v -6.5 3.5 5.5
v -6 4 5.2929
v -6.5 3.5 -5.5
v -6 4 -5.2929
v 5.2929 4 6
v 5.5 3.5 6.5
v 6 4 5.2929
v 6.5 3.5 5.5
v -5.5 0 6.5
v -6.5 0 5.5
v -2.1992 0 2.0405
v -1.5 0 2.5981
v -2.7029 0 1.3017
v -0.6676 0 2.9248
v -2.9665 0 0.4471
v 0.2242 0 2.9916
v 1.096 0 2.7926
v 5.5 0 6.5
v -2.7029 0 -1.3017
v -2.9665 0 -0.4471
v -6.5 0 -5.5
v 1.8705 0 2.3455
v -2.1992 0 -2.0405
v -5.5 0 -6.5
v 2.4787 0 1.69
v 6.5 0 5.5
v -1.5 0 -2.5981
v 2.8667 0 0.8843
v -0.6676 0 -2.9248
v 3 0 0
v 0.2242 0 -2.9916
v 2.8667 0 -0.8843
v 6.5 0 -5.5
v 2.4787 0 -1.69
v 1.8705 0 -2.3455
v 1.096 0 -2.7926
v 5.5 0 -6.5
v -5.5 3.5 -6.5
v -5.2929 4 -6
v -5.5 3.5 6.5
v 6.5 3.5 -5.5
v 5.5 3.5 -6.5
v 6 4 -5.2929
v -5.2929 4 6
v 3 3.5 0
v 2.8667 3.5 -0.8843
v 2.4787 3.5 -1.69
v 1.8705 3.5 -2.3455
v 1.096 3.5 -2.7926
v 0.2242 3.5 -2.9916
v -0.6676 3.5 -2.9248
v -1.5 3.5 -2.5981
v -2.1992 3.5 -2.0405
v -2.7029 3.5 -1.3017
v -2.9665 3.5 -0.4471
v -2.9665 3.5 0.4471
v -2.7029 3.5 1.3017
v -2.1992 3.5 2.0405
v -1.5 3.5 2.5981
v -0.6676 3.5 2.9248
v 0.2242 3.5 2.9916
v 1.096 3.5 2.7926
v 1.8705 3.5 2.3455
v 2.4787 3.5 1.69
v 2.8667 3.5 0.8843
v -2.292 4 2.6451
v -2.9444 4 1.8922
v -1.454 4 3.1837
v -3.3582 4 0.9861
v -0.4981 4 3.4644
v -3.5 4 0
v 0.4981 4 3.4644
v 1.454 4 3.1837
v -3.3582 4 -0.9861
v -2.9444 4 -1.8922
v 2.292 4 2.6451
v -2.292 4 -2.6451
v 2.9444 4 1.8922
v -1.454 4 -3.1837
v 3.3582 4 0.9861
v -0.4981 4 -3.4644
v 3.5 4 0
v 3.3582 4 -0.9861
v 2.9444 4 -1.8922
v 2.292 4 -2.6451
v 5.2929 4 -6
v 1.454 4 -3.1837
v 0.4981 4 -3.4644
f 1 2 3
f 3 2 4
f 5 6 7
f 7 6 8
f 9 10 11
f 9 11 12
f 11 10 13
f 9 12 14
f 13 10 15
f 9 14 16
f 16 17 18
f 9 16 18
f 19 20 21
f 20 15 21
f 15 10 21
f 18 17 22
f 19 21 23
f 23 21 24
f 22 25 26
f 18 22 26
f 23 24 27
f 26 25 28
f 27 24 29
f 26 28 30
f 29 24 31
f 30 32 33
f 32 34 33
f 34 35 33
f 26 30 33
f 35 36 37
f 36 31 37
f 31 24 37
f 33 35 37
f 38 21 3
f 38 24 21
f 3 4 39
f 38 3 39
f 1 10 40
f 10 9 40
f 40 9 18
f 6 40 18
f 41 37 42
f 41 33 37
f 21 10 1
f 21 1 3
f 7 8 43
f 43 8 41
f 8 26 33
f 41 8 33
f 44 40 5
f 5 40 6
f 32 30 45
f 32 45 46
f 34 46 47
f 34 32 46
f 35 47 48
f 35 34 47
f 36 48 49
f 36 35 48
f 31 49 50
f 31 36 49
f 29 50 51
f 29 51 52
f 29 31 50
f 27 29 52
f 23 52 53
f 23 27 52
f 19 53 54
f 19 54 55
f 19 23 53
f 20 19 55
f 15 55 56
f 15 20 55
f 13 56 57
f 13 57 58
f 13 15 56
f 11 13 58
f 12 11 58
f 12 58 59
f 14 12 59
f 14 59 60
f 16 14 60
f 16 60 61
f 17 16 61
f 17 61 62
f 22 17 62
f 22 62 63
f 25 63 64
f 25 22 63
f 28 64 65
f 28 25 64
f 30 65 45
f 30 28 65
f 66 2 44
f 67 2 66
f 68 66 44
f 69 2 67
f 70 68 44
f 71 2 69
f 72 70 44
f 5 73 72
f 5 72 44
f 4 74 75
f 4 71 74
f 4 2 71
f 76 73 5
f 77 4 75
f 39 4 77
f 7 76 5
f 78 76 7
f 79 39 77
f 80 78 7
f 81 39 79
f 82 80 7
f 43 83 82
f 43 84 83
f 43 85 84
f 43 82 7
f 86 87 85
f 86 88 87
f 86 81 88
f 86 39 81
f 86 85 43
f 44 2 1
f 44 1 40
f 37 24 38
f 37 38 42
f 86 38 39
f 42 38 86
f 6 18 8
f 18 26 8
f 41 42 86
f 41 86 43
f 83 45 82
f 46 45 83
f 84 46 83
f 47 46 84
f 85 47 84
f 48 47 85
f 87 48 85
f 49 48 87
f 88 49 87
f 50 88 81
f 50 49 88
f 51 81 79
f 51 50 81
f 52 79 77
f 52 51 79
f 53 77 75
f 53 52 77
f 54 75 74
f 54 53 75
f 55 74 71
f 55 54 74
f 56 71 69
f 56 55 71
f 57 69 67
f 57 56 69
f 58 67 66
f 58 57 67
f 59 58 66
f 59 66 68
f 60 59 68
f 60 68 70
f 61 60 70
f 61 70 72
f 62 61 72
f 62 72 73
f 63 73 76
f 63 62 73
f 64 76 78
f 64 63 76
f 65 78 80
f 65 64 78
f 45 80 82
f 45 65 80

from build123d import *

# Parameters (mm, degrees)
SKETCH1_W           = 13
SKETCH1_H           = 13
SKETCH1_R           = 3
BOSS_EXTRUDE1_DEPTH = 4
CHAMFER1_SIZE       = 1
CHAMFER3_SIZE       = 0.5


with BuildPart() as part:
    # Sketch1 → Boss-Extrude1 (new body)
    with BuildSketch(Plane(origin=(0, 0, 0), x_dir=(1, 0, 0), z_dir=(0, 1, 0))):
        Rectangle(SKETCH1_W, SKETCH1_H)
        Circle(SKETCH1_R, mode=Mode.SUBTRACT)
    extrude(amount=BOSS_EXTRUDE1_DEPTH)

    # Chamfer1
    chamfer1_edges = [part.edges().sort_by_distance(p)[0] for p in [
        (6.5, 2, 6.5),
        (-6.5, 2, 6.5),
        (-6.5, 2, -6.5),
        (6.5, 2, -6.5),
    ]]
    chamfer(chamfer1_edges, length=CHAMFER1_SIZE)

    # Chamfer3
    chamfer3_edges = [part.edges().sort_by_distance(p)[0] for p in [
        (-3, 4, 0),
        (-6.5, 4, 0),
        (0, 4, -6.5),
        (6.5, 4, 0),
        (0, 4, 6.5),
        (6, 4, 6),
        (6, 4, -6),
        (-6, 4, 6),
        (-6, 4, -6),
    ]]
    chamfer(chamfer3_edges, length=CHAMFER3_SIZE)


solid = part.part
